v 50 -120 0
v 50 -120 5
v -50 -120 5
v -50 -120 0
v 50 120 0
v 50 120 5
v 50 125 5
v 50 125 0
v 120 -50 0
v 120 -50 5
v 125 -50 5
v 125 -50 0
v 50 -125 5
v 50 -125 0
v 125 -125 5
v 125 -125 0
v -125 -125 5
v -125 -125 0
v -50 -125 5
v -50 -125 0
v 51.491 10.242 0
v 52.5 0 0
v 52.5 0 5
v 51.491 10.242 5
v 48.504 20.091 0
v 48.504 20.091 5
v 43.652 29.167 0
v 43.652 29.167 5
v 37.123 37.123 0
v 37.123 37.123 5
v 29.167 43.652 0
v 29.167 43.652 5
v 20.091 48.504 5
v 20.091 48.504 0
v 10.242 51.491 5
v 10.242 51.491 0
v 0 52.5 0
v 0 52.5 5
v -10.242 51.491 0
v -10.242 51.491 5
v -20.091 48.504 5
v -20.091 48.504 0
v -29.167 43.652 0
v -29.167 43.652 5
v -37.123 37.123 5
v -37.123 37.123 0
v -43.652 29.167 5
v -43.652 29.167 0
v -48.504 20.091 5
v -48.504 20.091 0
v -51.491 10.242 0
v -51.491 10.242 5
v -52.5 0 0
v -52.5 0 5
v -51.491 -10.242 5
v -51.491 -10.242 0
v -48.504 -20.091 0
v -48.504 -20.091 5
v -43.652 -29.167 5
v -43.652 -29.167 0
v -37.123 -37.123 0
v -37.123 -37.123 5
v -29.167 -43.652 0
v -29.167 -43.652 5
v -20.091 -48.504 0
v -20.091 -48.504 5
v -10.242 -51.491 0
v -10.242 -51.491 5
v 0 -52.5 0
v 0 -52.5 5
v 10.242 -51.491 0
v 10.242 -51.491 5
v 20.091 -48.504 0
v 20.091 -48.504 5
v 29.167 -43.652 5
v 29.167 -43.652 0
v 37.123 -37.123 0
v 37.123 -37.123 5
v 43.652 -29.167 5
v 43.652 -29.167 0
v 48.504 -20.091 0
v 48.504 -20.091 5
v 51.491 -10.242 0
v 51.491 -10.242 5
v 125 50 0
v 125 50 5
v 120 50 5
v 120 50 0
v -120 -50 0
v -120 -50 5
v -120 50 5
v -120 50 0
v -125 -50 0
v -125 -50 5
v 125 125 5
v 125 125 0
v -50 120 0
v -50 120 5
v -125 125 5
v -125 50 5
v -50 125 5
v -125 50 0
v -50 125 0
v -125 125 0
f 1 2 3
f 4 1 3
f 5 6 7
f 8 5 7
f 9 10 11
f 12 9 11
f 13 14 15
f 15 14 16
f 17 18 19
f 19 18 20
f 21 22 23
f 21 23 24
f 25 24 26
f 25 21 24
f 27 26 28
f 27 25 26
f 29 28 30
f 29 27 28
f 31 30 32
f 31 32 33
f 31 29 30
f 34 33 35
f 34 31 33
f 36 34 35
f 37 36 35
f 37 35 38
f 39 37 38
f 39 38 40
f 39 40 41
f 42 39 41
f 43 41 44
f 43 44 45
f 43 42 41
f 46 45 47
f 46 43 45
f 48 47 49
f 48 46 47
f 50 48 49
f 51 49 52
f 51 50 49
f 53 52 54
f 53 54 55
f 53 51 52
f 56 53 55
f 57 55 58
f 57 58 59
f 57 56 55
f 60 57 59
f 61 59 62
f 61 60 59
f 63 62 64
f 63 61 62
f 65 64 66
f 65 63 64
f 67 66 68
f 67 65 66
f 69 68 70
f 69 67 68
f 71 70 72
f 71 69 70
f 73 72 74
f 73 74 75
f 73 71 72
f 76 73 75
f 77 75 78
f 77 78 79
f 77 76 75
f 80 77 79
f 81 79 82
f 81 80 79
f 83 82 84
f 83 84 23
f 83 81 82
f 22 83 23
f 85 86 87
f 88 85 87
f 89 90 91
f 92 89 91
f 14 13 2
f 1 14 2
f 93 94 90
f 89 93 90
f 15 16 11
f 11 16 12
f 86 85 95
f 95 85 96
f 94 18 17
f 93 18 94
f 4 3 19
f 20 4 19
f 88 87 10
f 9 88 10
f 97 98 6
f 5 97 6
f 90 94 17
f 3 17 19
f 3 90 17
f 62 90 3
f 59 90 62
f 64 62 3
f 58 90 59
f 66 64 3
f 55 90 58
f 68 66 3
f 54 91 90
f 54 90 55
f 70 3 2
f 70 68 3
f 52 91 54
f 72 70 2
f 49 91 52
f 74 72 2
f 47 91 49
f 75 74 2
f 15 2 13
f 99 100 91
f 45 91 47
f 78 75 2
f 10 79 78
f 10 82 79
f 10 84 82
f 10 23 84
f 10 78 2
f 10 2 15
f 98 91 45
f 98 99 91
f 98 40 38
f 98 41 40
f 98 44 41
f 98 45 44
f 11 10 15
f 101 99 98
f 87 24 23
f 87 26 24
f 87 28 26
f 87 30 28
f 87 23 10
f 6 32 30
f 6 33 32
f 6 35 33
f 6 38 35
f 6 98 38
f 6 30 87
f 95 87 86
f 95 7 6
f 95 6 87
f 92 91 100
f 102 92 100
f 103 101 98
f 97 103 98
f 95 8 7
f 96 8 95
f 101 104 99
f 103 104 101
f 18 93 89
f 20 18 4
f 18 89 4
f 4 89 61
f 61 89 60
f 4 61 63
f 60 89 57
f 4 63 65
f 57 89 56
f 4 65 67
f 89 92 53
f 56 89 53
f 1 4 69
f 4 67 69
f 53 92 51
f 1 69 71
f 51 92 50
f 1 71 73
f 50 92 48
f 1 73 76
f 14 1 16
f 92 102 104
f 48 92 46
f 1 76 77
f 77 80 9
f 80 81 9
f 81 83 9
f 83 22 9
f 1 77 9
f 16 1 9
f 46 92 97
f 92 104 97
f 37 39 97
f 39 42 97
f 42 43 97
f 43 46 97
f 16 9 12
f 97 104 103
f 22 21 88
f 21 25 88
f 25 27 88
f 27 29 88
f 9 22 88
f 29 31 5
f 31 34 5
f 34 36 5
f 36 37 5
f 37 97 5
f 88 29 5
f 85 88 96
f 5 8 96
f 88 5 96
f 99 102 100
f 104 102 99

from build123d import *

# Parameters (mm, degrees)
F0_W     = 250
F0_H     = 250
F0_R     = 52.5
F1_DEPTH = 5
F3_DEPTH = 5.001


with BuildPart() as f1:
    # F0 (on Top) → F1 (new body)
    with BuildSketch(Plane.XY):
        Rectangle(F0_W, F0_H)
        Circle(F0_R, mode=Mode.SUBTRACT)
    extrude(amount=F1_DEPTH)

    # F2 (on face) → F3 (cut, through all)
    with BuildSketch(Plane.XY.offset(5)):
        Polygon((0, 125), (-50, 125), (-50, 120), (0, 120), (50, 120), (50, 125), align=None)
        Polygon((-120, 50), (-125, 50), (-125, 0), (-125, -50), (-120, -50), (-120, 0), align=None)
        Polygon((-50, -120), (-50, -125), (0, -125), (50, -125), (50, -120), (0, -120), align=None)
        Polygon((120, -50), (125, -50), (125, 0), (125, 50), (120, 50), (120, 0), align=None)
    extrude(amount=-F3_DEPTH, mode=Mode.SUBTRACT)


solid = f1.part
